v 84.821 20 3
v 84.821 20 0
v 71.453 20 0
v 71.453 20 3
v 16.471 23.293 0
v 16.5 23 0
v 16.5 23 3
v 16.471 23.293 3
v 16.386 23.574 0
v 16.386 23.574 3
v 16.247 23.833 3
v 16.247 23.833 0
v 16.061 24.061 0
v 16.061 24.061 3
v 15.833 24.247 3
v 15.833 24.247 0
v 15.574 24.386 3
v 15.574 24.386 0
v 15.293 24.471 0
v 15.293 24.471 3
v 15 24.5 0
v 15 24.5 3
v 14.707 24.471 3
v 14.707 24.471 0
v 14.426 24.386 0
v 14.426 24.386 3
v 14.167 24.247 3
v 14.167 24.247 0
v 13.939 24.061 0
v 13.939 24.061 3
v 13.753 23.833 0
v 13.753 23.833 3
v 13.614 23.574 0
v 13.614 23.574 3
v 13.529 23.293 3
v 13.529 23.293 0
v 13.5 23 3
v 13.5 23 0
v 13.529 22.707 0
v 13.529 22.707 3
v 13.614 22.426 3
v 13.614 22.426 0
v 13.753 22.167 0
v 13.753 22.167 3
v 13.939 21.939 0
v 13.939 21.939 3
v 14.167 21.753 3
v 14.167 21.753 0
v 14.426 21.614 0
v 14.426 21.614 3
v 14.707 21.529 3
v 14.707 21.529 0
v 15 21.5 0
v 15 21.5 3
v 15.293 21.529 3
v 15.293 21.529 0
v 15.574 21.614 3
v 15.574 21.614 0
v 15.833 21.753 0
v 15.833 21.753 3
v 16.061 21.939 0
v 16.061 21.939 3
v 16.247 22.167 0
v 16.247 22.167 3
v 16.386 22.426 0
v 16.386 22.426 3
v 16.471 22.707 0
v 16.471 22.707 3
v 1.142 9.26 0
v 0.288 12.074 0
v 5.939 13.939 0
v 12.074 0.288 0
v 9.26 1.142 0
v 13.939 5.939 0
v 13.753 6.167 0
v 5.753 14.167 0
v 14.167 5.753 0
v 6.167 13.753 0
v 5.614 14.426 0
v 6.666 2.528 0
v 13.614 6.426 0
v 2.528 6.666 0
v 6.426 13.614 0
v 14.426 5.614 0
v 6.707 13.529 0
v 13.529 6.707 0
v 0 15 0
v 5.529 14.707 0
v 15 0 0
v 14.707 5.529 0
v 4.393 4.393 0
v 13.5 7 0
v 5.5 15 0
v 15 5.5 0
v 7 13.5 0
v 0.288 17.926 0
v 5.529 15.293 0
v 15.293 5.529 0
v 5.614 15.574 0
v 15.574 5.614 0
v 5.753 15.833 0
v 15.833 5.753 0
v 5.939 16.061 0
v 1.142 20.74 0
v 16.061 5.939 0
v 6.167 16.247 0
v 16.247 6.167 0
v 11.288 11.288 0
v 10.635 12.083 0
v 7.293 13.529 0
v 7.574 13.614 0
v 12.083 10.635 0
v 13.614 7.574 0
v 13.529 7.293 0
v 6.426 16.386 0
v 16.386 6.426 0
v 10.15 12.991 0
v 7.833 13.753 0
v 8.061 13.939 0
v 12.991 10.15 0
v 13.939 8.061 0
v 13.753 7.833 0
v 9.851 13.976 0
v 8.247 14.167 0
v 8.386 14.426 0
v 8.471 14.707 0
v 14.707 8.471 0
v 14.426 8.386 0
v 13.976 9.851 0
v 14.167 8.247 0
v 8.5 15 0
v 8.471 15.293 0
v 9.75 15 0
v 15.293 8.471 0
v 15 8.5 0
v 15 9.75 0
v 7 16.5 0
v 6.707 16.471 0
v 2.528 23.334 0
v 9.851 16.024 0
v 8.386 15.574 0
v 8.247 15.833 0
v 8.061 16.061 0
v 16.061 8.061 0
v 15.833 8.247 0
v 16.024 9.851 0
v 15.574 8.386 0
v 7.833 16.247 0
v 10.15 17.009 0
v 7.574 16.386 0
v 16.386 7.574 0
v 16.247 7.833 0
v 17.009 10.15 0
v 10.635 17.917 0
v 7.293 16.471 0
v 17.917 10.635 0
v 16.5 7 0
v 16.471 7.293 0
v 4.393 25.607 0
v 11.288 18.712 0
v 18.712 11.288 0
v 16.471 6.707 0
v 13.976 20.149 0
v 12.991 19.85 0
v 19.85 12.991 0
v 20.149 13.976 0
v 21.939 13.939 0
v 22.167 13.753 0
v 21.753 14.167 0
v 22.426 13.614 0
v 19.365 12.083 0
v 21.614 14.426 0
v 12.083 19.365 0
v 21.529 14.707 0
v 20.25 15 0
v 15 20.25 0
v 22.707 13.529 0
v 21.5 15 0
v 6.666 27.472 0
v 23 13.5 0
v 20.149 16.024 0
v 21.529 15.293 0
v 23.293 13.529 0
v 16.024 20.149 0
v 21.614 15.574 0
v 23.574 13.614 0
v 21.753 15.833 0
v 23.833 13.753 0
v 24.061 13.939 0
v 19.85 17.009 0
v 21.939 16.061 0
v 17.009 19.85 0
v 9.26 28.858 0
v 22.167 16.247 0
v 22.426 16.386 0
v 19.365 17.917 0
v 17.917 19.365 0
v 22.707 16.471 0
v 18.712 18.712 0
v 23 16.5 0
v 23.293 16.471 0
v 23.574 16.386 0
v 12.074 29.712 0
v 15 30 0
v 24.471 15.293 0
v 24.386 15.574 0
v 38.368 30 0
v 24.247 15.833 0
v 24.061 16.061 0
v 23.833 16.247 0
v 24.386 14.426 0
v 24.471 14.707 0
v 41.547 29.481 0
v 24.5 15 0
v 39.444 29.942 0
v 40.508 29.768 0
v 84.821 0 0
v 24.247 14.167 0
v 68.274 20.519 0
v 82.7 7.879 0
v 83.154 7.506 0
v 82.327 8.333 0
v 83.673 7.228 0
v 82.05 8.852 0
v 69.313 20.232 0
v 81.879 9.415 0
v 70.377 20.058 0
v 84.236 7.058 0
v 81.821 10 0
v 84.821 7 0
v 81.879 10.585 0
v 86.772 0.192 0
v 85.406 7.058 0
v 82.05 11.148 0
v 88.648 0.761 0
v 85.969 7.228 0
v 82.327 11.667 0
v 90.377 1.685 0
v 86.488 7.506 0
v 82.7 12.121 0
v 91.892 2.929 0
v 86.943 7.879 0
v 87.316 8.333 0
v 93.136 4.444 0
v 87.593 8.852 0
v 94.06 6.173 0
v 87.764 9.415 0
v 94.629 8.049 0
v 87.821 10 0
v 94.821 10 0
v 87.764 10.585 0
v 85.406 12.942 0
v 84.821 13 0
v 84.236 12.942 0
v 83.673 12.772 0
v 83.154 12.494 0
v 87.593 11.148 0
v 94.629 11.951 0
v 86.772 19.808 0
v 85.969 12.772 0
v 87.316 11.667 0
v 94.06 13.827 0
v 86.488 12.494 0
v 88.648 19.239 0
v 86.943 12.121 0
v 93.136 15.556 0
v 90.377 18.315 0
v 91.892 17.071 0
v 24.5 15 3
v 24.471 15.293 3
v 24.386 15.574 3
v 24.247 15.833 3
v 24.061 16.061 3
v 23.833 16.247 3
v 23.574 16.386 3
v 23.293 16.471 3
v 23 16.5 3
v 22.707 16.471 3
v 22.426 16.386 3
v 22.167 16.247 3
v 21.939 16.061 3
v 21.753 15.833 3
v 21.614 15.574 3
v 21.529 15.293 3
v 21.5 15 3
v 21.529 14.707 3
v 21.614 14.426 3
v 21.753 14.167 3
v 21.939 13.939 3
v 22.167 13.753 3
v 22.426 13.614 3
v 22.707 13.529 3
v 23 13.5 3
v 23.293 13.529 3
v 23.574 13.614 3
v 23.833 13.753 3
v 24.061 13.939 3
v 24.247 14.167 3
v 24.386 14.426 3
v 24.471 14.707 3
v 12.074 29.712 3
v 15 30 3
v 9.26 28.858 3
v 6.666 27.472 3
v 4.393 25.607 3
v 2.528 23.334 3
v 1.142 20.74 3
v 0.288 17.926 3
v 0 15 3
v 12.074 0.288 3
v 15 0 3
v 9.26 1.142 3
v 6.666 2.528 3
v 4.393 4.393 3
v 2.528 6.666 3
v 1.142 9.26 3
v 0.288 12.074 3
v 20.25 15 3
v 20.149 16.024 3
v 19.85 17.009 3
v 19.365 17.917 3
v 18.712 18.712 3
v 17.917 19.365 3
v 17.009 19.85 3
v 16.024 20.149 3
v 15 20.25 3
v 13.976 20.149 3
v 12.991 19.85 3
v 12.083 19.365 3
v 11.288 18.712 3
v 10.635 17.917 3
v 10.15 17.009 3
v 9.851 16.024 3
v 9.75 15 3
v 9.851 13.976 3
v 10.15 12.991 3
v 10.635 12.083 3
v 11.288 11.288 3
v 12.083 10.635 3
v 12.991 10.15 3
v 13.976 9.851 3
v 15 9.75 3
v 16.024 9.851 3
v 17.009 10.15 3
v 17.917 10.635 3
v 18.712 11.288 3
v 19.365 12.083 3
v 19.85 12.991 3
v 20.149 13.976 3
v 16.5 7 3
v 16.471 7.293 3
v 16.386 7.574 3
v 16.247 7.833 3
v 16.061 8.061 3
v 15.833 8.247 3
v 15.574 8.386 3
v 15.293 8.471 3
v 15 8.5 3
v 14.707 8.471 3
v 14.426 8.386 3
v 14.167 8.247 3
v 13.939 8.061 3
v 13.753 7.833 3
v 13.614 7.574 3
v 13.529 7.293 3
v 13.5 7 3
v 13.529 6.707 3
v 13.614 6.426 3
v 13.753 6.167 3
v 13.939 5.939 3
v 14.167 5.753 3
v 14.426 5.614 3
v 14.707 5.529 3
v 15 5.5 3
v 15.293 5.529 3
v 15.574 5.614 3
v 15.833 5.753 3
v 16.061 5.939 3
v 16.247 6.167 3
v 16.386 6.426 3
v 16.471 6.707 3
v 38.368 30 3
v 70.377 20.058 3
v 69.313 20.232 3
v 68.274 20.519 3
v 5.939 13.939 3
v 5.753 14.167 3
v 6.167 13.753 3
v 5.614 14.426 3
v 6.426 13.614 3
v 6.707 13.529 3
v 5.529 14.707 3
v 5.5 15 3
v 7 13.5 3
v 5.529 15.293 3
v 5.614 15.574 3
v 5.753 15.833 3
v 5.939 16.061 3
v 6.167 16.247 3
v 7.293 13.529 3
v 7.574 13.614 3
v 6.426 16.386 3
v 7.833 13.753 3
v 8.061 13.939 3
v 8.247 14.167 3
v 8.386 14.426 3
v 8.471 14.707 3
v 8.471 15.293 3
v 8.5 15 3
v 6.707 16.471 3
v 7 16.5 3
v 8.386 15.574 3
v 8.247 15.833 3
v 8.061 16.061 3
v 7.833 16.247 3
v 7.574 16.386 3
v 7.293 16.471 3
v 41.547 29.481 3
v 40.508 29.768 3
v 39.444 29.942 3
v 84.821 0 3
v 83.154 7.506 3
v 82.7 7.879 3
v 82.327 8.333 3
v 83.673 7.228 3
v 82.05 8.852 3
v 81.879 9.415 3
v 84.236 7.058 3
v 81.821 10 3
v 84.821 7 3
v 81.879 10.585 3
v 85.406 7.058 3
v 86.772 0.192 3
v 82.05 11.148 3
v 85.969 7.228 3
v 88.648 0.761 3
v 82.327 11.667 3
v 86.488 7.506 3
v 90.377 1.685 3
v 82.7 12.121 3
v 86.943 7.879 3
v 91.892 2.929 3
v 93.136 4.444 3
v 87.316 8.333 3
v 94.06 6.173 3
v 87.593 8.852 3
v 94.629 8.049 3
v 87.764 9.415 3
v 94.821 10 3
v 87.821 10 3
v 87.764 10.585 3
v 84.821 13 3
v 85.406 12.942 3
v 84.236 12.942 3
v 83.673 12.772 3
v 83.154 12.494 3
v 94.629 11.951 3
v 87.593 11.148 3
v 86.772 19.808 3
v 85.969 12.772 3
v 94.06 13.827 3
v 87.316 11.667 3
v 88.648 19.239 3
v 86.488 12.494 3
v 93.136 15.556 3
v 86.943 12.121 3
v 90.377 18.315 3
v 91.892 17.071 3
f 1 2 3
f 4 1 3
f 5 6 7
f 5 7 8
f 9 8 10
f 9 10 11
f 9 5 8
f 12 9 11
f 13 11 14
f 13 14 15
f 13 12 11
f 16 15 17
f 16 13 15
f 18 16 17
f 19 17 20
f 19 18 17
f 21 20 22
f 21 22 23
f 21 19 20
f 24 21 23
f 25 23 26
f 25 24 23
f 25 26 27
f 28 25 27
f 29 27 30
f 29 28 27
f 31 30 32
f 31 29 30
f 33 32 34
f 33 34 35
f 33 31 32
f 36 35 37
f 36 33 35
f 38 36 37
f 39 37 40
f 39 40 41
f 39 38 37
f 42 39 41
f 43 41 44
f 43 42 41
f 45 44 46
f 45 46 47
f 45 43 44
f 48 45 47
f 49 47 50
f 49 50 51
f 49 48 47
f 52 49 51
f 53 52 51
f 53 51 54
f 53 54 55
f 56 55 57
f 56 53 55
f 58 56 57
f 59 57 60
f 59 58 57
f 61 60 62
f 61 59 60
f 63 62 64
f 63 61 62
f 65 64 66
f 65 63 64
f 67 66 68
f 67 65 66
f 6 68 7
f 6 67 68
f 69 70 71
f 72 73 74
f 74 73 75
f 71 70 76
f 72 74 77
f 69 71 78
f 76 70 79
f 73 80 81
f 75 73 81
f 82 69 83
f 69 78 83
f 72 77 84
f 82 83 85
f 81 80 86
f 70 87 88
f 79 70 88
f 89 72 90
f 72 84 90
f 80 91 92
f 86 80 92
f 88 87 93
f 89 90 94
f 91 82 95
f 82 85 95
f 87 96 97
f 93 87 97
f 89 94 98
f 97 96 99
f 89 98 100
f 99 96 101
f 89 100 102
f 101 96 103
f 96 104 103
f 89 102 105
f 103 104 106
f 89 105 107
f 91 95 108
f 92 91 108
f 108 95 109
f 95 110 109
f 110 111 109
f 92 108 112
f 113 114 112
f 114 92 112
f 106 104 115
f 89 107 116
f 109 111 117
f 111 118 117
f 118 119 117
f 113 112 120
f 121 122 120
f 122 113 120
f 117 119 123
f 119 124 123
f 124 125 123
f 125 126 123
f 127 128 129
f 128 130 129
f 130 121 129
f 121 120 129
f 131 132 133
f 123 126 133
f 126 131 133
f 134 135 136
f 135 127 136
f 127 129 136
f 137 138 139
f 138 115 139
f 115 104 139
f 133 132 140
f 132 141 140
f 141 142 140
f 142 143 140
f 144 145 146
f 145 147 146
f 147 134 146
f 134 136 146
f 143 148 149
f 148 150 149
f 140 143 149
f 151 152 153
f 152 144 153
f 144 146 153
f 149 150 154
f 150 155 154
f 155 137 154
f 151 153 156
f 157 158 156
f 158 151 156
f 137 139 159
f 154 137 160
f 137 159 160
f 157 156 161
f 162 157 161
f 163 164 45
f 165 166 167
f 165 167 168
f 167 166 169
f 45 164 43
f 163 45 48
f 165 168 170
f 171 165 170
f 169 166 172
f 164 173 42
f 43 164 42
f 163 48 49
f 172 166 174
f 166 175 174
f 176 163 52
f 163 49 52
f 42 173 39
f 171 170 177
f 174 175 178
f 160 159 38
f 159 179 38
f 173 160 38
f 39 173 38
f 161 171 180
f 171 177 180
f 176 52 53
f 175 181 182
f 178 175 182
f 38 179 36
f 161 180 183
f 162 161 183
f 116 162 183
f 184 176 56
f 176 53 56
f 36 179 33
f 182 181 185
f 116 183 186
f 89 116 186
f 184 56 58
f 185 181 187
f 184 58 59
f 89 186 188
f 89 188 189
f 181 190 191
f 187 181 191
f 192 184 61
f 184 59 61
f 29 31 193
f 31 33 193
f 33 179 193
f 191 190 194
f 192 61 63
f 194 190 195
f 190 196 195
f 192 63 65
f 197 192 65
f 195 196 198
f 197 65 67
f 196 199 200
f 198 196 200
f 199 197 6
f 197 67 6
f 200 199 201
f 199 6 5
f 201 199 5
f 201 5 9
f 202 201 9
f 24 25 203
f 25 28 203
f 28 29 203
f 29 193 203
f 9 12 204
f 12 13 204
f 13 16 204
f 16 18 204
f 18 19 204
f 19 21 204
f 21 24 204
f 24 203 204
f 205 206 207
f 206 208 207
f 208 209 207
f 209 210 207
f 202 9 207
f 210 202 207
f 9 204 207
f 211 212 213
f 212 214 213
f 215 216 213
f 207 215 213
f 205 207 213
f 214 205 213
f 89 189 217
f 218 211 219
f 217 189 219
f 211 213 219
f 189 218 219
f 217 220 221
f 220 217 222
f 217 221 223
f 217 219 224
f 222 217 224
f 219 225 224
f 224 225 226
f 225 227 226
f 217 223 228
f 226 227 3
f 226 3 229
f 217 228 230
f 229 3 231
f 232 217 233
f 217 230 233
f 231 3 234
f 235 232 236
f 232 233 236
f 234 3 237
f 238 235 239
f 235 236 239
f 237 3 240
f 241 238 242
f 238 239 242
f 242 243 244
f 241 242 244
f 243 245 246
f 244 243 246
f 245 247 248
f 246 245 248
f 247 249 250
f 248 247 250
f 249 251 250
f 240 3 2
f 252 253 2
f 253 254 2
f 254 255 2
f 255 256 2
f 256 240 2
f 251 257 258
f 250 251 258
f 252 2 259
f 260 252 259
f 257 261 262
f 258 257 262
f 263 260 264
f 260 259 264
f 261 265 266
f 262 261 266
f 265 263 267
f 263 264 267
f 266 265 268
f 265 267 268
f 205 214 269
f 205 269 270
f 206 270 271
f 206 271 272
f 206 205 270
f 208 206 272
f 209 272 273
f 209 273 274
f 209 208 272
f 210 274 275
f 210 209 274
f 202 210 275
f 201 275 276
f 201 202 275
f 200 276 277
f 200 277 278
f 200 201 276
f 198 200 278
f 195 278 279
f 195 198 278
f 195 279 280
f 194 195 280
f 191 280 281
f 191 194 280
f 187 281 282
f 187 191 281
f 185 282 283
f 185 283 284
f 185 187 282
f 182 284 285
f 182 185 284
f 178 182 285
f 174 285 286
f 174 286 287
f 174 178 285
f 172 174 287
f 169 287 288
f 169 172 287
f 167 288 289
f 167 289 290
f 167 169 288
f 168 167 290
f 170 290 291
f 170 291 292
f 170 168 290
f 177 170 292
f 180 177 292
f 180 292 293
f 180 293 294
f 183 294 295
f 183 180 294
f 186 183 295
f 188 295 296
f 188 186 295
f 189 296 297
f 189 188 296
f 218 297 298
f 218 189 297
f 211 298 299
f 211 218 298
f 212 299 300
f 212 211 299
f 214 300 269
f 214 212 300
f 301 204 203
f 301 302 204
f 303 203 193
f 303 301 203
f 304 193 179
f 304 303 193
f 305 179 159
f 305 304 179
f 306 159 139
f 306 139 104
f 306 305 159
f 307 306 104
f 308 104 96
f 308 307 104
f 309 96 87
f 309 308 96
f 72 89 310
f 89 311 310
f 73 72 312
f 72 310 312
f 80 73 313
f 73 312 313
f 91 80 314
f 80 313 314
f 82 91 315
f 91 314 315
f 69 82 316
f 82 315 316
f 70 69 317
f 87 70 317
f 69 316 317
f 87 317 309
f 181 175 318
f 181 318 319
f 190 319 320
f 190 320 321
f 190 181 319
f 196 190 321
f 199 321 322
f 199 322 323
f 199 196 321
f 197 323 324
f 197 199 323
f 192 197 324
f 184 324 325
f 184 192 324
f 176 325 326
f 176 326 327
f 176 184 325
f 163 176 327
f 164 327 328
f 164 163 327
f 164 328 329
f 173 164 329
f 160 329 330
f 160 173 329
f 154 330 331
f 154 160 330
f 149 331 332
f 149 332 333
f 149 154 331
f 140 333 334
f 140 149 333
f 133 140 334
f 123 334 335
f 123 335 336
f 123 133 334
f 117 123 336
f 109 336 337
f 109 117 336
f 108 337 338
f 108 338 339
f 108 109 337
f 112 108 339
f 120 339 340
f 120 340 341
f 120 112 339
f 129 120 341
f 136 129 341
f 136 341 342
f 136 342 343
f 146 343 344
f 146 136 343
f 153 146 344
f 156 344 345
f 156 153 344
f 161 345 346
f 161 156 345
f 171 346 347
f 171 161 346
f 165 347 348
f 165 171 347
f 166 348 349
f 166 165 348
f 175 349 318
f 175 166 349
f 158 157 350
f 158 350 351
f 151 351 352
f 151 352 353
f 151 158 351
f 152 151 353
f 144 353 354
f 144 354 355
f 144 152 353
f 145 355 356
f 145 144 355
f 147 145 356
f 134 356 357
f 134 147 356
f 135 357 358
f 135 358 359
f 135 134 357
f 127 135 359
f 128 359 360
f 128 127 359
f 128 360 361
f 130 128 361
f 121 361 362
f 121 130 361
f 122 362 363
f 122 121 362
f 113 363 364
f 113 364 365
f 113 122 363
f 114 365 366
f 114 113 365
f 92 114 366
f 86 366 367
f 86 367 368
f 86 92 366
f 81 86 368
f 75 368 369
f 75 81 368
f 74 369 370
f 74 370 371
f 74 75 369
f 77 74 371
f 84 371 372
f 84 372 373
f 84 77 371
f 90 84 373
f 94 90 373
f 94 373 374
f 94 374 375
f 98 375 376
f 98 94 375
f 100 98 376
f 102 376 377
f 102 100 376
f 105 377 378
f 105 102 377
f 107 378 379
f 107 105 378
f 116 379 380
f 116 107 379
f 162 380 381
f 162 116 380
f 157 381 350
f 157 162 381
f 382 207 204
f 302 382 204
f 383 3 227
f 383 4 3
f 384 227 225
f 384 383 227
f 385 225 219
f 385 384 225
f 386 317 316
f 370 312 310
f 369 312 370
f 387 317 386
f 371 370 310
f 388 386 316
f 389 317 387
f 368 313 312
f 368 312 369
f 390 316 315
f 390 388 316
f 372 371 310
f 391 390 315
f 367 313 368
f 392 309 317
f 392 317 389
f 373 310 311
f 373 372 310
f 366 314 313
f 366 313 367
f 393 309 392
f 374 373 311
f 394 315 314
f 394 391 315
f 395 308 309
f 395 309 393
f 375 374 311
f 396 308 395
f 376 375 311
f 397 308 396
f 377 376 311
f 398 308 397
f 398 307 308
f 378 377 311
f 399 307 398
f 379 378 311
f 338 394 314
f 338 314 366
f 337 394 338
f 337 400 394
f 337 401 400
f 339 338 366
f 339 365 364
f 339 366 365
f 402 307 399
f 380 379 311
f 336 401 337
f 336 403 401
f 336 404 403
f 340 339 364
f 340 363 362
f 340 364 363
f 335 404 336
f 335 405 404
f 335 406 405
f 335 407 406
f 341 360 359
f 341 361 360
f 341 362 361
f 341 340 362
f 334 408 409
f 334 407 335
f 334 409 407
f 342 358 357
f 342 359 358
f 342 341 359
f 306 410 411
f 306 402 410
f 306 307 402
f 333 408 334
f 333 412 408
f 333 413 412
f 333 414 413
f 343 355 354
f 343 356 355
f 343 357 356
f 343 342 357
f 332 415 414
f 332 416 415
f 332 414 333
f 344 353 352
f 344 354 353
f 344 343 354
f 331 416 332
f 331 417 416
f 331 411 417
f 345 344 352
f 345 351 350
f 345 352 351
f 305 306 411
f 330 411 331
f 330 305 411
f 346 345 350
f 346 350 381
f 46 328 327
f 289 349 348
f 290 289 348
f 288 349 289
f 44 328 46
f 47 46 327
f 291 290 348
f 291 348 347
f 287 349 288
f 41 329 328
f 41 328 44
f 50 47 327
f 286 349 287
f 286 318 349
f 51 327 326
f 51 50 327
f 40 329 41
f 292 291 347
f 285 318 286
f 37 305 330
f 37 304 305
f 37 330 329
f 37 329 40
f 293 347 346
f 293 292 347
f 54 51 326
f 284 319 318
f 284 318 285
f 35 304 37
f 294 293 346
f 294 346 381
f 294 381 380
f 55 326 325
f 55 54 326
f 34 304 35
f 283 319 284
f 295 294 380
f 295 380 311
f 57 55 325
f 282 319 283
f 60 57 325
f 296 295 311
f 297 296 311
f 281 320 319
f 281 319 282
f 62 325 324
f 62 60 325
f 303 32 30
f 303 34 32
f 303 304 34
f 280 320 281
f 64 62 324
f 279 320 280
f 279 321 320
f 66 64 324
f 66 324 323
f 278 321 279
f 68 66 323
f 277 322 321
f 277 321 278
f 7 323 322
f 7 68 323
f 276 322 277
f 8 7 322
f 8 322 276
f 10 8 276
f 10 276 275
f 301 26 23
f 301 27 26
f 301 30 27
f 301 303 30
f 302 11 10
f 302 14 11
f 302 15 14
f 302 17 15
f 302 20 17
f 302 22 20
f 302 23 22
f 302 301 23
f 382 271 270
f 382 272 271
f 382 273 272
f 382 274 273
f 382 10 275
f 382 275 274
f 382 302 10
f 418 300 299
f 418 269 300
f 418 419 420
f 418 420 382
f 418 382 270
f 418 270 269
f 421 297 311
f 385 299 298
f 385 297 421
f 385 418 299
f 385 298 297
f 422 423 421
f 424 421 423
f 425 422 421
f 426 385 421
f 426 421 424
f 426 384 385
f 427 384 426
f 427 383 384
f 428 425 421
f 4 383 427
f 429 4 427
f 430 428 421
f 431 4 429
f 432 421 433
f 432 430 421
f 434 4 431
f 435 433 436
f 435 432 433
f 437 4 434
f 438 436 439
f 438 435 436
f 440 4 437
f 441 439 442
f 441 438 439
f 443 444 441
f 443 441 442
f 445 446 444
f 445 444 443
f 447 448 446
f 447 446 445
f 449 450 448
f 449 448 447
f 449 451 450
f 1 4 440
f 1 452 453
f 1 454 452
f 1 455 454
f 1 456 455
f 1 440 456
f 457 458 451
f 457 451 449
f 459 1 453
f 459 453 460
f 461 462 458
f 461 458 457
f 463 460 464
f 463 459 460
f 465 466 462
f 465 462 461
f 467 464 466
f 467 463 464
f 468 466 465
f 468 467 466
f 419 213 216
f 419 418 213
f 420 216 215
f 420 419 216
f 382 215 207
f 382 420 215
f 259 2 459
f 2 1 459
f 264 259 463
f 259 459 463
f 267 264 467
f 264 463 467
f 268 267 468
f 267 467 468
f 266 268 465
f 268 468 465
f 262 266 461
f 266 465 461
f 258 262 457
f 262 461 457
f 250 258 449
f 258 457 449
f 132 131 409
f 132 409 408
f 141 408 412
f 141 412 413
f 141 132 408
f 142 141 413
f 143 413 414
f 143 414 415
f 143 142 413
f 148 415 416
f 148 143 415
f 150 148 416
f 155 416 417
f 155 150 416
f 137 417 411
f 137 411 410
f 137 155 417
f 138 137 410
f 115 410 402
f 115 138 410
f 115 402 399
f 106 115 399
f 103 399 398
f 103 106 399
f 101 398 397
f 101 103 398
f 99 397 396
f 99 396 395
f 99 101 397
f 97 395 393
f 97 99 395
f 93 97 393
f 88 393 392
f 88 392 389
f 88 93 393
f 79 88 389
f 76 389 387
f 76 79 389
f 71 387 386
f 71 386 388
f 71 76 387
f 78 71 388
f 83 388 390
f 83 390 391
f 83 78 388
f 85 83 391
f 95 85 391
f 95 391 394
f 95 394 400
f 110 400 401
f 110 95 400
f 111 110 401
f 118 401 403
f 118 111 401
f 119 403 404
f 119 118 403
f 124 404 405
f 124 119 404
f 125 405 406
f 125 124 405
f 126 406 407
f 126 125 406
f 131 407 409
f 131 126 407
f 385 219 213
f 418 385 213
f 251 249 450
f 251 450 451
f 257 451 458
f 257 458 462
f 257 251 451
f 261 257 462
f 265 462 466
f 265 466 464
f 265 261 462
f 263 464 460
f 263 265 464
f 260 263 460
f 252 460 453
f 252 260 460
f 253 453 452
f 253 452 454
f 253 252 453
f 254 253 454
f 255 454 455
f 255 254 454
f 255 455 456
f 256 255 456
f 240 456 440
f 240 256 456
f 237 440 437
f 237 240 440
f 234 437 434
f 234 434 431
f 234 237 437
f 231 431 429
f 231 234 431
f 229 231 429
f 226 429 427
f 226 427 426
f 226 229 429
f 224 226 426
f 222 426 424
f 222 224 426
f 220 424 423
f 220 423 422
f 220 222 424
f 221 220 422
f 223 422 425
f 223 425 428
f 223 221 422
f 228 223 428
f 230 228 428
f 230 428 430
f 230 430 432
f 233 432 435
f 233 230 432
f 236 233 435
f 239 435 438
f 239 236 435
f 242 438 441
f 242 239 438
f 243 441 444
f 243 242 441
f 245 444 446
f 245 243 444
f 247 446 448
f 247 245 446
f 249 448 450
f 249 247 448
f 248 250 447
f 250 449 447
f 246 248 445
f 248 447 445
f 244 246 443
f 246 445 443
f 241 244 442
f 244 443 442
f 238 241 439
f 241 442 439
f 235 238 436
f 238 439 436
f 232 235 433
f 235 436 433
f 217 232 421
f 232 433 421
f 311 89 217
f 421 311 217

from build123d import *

# Parameters (mm, degrees)
SKETCH_1_R      = 5.25
SKETCH_1_R_2    = 1.5
SKETCH_1_R_3    = 3
EXTRUDE_1_DEPTH = 3
FILLET_1_R      = 10
FILLET_2_R      = 15


with BuildPart() as part:
    # 草图1 → 凸台-拉伸1 (new body)
    with BuildSketch(Plane.XY):
        Polygon((94.821200219, 20), (69.821200219, 20), (40, 30), (0, 30), (0, 0), (94.821200219, 0), align=None)
        with Locations((15, 15)):
            Circle(SKETCH_1_R, mode=Mode.SUBTRACT)
        with Locations((15, 23)):
            Circle(SKETCH_1_R_2, mode=Mode.SUBTRACT)
        with Locations((15, 7)):
            Circle(SKETCH_1_R_2, mode=Mode.SUBTRACT)
        with Locations((23, 15)):
            Circle(SKETCH_1_R_2, mode=Mode.SUBTRACT)
        with Locations((7, 15)):
            Circle(SKETCH_1_R_2, mode=Mode.SUBTRACT)
        with Locations((84.821200219, 10)):
            Circle(SKETCH_1_R_3, mode=Mode.SUBTRACT)
    extrude(amount=EXTRUDE_1_DEPTH)

    # 圆角1
    fillet_1_edges = [part.edges().sort_by_distance(p)[0] for p in [
        (94.821200219, 0, 1.5),
        (94.821200219, 20, 1.5),
        (69.821200219, 20, 1.5),
        (40, 30, 1.5),
    ]]
    fillet(fillet_1_edges, radius=FILLET_1_R - 0.0001)  # a hair under: the kernel refuses the full size

    # 圆角2
    fillet_2_edges = [part.edges().sort_by_distance(p)[0] for p in [
        (0, 0, 1.5),
        (0, 30, 1.5),
    ]]
    fillet(fillet_2_edges, radius=FILLET_2_R - 0.0001)  # a hair under: the kernel refuses the full size


solid = part.part
